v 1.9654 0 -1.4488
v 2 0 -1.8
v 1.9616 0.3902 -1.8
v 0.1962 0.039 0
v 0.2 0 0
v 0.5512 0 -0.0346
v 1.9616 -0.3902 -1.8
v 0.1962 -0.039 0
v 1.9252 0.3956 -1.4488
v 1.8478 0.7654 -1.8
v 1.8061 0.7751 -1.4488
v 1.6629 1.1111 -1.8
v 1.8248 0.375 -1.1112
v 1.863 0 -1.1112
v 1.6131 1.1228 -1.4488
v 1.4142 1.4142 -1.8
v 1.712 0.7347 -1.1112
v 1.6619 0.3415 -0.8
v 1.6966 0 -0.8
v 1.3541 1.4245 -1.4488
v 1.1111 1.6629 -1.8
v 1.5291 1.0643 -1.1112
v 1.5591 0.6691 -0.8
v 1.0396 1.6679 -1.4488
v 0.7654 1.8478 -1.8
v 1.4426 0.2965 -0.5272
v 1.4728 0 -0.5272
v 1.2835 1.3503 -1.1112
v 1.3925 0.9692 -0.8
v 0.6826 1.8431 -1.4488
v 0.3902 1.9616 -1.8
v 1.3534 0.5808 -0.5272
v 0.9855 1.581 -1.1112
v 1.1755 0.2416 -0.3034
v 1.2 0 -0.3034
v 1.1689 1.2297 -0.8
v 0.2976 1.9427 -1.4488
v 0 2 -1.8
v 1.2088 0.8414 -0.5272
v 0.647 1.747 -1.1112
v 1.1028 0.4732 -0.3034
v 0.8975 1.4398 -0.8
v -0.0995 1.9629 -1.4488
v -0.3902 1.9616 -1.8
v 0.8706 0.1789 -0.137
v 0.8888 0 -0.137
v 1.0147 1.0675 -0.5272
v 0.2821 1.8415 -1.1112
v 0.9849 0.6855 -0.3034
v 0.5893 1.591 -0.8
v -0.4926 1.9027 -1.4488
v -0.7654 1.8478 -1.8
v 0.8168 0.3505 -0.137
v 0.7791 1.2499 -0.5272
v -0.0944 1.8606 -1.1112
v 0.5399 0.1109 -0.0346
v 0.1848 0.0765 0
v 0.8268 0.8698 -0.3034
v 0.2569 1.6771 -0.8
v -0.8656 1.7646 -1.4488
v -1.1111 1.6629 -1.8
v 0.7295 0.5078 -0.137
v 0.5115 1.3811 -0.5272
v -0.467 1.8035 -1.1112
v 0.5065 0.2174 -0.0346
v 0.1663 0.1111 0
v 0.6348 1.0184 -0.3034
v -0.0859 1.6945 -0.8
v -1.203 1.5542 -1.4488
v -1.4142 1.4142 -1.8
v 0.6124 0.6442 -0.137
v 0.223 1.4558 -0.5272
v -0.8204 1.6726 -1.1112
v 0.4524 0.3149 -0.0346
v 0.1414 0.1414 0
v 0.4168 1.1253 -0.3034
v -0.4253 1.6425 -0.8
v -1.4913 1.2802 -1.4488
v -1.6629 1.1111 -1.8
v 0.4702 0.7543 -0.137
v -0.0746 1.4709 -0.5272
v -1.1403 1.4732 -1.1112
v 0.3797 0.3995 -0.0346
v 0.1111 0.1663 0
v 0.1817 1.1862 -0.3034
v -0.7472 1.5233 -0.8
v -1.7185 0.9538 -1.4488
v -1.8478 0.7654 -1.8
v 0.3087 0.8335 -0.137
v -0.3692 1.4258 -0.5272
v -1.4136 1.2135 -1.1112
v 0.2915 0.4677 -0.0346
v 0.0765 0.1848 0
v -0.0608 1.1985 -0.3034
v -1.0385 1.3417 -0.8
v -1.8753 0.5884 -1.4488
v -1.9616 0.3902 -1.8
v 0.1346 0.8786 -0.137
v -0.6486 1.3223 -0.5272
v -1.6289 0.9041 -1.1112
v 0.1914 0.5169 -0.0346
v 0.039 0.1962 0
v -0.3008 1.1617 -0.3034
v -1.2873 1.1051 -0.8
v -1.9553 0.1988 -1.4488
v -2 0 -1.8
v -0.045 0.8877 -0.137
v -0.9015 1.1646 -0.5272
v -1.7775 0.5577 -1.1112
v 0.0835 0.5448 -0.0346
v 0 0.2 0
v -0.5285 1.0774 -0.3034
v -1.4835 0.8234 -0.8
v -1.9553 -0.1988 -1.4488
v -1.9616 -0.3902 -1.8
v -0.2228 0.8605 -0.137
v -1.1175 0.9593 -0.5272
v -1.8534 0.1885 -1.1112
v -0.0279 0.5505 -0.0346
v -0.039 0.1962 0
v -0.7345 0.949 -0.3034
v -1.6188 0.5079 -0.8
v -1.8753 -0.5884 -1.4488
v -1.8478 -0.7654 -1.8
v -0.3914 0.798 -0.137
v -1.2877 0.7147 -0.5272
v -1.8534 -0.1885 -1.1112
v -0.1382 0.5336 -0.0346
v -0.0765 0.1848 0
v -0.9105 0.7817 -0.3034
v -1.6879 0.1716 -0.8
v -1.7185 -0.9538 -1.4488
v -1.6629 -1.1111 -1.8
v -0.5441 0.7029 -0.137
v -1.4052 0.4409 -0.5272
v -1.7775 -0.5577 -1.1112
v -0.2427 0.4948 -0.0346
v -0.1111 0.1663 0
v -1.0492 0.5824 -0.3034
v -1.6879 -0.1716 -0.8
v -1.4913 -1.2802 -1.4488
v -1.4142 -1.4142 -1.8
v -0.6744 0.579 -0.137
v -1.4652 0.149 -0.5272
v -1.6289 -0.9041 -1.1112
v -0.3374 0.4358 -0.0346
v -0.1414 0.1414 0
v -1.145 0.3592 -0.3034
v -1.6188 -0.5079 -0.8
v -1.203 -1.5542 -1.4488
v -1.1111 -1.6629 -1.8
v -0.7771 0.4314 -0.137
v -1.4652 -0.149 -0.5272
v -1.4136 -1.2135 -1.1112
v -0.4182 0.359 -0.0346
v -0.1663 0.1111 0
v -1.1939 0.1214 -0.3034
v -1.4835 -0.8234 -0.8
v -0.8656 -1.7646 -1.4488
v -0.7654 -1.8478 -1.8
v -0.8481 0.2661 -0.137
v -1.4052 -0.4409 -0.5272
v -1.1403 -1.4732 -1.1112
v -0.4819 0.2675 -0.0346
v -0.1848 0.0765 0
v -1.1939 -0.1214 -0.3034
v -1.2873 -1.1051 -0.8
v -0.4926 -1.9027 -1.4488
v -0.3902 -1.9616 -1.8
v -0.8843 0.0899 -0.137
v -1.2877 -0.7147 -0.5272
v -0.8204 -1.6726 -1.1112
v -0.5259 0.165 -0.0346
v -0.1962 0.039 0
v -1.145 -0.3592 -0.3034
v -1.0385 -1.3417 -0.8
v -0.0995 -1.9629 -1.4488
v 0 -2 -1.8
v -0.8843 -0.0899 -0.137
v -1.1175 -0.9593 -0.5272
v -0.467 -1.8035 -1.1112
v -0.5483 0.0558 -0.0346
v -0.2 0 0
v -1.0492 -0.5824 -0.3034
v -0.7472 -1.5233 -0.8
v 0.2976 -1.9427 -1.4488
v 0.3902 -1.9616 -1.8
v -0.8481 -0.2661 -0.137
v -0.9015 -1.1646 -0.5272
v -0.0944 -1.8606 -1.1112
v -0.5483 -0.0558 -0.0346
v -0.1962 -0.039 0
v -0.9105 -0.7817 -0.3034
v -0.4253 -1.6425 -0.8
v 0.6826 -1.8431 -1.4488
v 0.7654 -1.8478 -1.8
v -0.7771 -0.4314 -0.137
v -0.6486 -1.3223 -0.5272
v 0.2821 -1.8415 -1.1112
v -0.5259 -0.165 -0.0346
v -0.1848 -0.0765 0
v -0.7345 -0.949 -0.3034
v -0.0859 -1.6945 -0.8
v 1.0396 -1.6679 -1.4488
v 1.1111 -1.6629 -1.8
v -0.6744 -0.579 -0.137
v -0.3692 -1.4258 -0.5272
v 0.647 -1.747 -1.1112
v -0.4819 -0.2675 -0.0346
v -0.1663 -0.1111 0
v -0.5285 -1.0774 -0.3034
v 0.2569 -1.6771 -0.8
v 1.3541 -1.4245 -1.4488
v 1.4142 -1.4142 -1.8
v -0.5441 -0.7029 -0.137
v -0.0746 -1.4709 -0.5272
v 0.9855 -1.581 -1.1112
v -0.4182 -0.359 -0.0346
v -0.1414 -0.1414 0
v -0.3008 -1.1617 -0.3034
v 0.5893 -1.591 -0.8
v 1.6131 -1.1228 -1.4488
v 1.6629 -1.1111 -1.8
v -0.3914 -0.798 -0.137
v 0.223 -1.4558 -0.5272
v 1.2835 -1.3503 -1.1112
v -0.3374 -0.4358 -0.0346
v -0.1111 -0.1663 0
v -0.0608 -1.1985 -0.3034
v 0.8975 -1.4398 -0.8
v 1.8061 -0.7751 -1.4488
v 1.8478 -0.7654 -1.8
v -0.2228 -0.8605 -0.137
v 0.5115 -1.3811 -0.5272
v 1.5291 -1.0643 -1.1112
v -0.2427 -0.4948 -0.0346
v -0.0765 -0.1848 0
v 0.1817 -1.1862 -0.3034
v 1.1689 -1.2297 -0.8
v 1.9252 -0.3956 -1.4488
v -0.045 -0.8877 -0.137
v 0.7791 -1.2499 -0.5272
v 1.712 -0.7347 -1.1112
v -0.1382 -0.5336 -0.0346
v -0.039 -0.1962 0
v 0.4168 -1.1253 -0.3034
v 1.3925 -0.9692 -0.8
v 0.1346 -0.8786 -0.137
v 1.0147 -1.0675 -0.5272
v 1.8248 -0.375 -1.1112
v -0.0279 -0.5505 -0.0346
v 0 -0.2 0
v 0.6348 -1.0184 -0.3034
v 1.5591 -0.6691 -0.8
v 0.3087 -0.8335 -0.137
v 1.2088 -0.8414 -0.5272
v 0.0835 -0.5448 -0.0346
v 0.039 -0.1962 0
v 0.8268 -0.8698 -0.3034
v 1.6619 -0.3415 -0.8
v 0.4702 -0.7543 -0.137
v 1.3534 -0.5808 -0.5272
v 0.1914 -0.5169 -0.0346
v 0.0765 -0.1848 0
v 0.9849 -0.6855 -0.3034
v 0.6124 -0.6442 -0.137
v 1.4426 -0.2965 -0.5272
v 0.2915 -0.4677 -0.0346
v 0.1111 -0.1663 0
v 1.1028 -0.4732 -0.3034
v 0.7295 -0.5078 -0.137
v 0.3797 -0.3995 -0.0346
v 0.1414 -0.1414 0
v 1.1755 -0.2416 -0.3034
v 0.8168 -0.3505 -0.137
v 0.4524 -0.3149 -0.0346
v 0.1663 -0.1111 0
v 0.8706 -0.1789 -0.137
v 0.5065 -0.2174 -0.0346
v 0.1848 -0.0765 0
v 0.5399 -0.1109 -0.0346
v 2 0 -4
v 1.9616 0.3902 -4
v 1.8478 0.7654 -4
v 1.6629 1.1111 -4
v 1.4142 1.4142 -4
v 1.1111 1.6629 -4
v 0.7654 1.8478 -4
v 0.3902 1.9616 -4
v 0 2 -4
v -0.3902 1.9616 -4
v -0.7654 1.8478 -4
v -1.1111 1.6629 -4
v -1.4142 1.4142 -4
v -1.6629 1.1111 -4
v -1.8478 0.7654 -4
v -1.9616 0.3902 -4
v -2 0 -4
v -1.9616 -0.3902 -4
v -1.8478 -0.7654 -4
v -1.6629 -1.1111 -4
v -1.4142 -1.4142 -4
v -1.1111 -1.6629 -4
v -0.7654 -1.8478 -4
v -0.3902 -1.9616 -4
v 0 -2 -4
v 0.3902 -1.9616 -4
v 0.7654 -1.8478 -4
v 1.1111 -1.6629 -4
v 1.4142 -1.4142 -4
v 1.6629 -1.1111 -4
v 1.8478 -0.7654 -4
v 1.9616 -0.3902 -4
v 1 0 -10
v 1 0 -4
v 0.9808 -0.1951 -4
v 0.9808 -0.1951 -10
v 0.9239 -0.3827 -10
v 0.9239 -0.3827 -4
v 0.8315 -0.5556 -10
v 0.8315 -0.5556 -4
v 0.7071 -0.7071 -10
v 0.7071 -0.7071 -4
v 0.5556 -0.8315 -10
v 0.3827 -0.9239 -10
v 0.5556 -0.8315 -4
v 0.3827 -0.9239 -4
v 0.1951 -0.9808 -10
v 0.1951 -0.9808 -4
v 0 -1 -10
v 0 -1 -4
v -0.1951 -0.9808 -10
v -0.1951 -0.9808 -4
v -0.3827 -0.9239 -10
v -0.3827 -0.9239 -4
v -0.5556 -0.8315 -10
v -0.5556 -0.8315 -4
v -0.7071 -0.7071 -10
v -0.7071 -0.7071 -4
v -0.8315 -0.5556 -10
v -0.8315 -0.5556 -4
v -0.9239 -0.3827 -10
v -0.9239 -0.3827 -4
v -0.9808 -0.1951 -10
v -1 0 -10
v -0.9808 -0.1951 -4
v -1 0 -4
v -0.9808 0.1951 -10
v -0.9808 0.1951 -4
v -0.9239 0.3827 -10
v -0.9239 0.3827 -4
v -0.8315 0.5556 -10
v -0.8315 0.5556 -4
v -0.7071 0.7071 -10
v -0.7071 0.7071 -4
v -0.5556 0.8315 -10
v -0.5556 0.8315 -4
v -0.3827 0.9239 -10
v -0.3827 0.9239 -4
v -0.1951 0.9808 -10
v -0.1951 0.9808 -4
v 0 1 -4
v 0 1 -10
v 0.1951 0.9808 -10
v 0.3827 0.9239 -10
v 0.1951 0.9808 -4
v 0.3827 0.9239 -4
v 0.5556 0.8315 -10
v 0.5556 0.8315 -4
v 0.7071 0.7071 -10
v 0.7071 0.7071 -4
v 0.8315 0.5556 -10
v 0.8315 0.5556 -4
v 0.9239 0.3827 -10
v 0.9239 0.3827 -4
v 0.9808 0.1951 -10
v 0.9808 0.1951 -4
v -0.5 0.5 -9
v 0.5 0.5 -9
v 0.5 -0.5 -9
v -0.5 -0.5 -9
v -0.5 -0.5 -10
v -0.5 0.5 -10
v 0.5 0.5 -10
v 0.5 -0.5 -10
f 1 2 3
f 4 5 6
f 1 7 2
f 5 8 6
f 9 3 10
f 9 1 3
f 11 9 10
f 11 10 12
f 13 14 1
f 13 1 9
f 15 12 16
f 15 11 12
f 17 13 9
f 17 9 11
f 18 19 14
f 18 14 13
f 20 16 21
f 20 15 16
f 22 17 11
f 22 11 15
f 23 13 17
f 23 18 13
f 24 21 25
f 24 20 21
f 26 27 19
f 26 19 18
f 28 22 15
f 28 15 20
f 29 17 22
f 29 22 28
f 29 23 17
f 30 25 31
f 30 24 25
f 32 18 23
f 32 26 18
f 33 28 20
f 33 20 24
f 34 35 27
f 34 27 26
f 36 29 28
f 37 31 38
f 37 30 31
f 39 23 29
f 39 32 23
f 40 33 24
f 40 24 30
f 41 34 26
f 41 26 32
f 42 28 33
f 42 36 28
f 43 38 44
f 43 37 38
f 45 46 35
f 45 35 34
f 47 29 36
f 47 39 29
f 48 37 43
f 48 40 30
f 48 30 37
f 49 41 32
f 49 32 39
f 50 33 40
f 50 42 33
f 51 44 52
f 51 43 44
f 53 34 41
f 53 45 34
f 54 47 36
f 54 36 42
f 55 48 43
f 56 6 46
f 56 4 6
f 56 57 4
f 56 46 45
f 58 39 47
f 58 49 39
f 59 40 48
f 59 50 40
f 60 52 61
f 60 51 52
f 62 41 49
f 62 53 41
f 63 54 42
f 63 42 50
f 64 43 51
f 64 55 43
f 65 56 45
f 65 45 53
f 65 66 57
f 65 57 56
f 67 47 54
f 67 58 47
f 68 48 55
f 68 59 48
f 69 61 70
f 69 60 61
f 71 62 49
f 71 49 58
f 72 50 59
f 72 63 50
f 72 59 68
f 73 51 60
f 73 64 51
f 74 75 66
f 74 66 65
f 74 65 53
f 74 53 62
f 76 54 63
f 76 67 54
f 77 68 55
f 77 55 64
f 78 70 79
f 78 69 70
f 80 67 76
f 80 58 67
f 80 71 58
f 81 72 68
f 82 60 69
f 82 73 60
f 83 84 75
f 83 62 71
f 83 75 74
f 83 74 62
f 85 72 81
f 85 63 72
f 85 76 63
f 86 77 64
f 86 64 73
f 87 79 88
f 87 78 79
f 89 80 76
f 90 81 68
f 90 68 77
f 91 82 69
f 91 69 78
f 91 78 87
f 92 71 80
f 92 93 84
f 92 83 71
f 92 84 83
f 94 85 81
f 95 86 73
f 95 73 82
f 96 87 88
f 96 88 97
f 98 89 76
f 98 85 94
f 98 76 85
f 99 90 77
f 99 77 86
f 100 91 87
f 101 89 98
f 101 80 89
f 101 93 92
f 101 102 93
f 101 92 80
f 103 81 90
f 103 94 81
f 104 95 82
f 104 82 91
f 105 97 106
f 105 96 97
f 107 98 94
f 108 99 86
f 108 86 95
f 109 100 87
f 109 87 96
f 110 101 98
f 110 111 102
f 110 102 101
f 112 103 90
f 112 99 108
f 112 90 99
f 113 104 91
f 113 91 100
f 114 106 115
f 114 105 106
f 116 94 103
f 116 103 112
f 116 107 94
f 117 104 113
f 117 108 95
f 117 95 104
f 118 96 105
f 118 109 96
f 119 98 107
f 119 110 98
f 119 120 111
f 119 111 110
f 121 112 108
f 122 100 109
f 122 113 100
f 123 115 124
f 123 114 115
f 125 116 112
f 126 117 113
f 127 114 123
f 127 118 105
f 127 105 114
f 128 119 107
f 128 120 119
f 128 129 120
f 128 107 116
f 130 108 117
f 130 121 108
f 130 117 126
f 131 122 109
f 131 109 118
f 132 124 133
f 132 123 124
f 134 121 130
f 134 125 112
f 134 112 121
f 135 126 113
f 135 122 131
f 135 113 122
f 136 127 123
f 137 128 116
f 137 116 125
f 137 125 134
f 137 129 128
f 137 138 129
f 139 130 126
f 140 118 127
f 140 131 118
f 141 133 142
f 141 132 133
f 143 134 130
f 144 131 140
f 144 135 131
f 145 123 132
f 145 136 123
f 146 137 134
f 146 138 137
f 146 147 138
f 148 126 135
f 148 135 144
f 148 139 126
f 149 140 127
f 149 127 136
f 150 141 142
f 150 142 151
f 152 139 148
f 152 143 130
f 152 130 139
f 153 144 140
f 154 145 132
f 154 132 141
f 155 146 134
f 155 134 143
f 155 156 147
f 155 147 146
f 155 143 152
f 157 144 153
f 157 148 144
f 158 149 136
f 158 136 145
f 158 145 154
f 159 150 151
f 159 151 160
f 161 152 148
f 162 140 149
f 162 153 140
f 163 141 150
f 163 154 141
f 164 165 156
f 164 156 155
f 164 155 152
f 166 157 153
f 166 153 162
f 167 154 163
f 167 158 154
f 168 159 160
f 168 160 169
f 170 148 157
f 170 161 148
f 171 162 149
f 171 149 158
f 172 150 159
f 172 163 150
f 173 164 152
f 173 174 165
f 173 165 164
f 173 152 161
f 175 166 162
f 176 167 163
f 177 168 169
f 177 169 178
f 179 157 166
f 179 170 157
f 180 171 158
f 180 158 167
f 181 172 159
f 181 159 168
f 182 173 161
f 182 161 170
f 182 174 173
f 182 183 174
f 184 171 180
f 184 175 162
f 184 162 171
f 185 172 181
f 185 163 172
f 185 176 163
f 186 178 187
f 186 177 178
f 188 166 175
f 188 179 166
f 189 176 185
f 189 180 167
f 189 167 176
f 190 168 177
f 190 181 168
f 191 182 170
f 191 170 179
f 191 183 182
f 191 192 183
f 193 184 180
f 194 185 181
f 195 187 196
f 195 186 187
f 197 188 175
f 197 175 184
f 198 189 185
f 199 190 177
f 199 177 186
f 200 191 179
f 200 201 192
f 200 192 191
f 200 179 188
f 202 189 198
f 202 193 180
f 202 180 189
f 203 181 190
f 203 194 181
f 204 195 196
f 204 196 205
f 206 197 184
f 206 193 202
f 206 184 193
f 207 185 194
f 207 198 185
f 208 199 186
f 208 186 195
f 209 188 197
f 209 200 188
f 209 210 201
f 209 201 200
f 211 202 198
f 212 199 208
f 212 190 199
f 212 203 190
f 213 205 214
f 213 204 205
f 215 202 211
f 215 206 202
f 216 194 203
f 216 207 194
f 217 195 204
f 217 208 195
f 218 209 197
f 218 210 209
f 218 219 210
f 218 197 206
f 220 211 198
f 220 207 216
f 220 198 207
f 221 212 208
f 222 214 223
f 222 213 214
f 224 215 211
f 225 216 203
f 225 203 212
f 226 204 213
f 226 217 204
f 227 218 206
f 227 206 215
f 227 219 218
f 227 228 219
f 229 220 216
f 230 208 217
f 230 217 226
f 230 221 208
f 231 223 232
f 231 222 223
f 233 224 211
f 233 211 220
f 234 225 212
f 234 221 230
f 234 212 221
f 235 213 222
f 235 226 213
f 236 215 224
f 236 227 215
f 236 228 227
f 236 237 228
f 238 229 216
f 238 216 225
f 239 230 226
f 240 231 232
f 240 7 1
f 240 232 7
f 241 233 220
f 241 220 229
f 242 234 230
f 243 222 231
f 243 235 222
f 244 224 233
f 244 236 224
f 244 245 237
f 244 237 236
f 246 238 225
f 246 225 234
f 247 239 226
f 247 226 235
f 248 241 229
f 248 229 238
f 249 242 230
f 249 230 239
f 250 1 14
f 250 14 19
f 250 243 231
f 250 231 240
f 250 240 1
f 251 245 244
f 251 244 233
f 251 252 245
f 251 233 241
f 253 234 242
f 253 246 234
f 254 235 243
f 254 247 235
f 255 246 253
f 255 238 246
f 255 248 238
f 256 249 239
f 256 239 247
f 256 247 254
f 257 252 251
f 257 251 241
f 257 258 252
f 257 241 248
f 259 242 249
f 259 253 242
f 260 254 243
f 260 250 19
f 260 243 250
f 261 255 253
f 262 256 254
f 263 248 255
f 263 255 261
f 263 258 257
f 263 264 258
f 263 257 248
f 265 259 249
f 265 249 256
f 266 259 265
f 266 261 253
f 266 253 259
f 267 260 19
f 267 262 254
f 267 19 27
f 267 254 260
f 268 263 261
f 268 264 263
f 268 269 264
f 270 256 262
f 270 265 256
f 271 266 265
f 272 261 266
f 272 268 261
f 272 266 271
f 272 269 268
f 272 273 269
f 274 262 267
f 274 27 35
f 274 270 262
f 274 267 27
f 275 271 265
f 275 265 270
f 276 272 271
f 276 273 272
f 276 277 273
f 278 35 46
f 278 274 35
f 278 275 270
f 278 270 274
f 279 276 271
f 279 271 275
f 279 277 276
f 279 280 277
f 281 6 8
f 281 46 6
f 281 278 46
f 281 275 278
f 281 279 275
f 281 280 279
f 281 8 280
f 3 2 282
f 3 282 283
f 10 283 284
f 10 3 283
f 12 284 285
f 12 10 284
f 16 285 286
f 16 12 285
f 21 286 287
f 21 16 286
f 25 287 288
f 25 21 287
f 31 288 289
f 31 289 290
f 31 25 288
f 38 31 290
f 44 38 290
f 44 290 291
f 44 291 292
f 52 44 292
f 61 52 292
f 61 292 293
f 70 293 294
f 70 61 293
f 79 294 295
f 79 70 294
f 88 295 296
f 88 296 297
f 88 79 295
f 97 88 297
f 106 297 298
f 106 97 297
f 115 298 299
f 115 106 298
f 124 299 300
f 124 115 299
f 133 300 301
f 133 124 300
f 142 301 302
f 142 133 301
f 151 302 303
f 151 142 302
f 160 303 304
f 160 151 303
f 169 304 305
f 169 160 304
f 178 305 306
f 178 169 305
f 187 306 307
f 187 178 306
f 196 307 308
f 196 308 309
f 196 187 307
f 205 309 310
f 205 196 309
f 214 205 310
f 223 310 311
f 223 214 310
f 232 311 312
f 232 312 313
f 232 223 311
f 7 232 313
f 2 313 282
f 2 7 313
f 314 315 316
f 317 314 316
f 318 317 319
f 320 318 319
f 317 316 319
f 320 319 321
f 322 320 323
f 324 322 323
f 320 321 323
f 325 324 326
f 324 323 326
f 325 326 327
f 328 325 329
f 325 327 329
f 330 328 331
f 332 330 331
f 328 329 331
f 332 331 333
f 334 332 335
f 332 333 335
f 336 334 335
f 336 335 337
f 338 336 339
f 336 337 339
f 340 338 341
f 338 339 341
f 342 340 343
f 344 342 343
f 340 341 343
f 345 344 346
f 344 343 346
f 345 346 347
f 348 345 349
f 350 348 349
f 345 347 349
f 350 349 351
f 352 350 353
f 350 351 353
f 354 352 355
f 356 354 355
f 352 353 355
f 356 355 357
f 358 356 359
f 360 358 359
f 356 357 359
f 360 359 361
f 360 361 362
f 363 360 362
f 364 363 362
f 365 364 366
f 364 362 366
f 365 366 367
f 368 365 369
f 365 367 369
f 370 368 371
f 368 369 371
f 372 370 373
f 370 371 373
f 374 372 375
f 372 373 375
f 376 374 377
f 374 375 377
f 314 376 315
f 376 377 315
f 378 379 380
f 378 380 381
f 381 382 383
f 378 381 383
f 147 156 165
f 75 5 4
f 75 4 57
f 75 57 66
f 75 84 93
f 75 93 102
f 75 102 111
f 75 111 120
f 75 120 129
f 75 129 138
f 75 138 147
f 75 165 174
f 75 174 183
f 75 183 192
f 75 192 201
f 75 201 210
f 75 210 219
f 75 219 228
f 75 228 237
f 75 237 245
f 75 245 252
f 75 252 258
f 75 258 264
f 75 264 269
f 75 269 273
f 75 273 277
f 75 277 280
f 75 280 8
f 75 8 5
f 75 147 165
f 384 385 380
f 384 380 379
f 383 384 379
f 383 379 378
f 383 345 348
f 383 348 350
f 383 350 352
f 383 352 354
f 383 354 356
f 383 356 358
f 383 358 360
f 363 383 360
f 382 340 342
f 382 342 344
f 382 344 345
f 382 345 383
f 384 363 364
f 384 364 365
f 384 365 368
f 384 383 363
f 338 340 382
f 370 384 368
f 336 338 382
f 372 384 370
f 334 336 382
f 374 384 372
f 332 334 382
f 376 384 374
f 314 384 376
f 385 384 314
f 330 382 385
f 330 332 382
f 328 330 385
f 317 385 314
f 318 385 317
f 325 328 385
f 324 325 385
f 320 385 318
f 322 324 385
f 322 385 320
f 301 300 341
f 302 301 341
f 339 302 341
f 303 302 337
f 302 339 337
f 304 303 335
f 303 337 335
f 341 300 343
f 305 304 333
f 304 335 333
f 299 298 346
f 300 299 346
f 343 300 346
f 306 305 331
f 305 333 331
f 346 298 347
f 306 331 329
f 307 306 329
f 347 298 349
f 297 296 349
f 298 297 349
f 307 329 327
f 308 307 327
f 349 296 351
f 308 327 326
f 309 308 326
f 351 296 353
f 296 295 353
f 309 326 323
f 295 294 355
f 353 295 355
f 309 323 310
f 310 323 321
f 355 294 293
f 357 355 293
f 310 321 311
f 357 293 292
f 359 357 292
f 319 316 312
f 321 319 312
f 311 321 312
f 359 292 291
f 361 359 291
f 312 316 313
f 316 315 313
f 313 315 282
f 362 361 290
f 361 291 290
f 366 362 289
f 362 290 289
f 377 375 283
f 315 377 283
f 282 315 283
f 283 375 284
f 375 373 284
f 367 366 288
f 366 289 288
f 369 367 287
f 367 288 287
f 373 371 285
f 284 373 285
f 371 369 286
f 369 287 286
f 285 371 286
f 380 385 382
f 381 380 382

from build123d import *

# Parameters (mm, degrees)
SKETCH1_R           = 2
BASE_EXTRUDE_DEPTH  = 4
FILLET1_R           = 1.8
SKETCH2_R           = 1
BOSS_EXTRUDE1_DEPTH = 6
SKETCH3_W           = 1
SKETCH3_H           = 1
CUT_EXTRUDE1_DEPTH  = 1


with BuildPart() as part:
    # Sketch1 → Base-Extrude (new body)
    with BuildSketch(Plane.XY):
        Circle(SKETCH1_R)
    extrude(amount=-BASE_EXTRUDE_DEPTH)

    # Fillet1
    fillet1_edges = [part.edges().sort_by_distance(p)[0] for p in [
        (-2, 0, 0),
    ]]
    fillet(fillet1_edges, radius=FILLET1_R)

    # Sketch2 → Boss-Extrude1 (add)
    with BuildSketch(Plane(origin=(0, 0, -4), x_dir=(-1, 0, 0), z_dir=(0, 0, -1))):
        with Locations(Location((0, 0, 0), (0, 0, 180))):
            Circle(SKETCH2_R)
    extrude(amount=BOSS_EXTRUDE1_DEPTH)

    # Sketch3 → Cut-Extrude1 (cut)
    with BuildSketch(Plane(origin=(0, 0, -10), x_dir=(-1, 0, 0), z_dir=(0, 0, -1))):
        Rectangle(SKETCH3_W, SKETCH3_H)
    extrude(amount=-CUT_EXTRUDE1_DEPTH, mode=Mode.SUBTRACT)


solid = part.part
